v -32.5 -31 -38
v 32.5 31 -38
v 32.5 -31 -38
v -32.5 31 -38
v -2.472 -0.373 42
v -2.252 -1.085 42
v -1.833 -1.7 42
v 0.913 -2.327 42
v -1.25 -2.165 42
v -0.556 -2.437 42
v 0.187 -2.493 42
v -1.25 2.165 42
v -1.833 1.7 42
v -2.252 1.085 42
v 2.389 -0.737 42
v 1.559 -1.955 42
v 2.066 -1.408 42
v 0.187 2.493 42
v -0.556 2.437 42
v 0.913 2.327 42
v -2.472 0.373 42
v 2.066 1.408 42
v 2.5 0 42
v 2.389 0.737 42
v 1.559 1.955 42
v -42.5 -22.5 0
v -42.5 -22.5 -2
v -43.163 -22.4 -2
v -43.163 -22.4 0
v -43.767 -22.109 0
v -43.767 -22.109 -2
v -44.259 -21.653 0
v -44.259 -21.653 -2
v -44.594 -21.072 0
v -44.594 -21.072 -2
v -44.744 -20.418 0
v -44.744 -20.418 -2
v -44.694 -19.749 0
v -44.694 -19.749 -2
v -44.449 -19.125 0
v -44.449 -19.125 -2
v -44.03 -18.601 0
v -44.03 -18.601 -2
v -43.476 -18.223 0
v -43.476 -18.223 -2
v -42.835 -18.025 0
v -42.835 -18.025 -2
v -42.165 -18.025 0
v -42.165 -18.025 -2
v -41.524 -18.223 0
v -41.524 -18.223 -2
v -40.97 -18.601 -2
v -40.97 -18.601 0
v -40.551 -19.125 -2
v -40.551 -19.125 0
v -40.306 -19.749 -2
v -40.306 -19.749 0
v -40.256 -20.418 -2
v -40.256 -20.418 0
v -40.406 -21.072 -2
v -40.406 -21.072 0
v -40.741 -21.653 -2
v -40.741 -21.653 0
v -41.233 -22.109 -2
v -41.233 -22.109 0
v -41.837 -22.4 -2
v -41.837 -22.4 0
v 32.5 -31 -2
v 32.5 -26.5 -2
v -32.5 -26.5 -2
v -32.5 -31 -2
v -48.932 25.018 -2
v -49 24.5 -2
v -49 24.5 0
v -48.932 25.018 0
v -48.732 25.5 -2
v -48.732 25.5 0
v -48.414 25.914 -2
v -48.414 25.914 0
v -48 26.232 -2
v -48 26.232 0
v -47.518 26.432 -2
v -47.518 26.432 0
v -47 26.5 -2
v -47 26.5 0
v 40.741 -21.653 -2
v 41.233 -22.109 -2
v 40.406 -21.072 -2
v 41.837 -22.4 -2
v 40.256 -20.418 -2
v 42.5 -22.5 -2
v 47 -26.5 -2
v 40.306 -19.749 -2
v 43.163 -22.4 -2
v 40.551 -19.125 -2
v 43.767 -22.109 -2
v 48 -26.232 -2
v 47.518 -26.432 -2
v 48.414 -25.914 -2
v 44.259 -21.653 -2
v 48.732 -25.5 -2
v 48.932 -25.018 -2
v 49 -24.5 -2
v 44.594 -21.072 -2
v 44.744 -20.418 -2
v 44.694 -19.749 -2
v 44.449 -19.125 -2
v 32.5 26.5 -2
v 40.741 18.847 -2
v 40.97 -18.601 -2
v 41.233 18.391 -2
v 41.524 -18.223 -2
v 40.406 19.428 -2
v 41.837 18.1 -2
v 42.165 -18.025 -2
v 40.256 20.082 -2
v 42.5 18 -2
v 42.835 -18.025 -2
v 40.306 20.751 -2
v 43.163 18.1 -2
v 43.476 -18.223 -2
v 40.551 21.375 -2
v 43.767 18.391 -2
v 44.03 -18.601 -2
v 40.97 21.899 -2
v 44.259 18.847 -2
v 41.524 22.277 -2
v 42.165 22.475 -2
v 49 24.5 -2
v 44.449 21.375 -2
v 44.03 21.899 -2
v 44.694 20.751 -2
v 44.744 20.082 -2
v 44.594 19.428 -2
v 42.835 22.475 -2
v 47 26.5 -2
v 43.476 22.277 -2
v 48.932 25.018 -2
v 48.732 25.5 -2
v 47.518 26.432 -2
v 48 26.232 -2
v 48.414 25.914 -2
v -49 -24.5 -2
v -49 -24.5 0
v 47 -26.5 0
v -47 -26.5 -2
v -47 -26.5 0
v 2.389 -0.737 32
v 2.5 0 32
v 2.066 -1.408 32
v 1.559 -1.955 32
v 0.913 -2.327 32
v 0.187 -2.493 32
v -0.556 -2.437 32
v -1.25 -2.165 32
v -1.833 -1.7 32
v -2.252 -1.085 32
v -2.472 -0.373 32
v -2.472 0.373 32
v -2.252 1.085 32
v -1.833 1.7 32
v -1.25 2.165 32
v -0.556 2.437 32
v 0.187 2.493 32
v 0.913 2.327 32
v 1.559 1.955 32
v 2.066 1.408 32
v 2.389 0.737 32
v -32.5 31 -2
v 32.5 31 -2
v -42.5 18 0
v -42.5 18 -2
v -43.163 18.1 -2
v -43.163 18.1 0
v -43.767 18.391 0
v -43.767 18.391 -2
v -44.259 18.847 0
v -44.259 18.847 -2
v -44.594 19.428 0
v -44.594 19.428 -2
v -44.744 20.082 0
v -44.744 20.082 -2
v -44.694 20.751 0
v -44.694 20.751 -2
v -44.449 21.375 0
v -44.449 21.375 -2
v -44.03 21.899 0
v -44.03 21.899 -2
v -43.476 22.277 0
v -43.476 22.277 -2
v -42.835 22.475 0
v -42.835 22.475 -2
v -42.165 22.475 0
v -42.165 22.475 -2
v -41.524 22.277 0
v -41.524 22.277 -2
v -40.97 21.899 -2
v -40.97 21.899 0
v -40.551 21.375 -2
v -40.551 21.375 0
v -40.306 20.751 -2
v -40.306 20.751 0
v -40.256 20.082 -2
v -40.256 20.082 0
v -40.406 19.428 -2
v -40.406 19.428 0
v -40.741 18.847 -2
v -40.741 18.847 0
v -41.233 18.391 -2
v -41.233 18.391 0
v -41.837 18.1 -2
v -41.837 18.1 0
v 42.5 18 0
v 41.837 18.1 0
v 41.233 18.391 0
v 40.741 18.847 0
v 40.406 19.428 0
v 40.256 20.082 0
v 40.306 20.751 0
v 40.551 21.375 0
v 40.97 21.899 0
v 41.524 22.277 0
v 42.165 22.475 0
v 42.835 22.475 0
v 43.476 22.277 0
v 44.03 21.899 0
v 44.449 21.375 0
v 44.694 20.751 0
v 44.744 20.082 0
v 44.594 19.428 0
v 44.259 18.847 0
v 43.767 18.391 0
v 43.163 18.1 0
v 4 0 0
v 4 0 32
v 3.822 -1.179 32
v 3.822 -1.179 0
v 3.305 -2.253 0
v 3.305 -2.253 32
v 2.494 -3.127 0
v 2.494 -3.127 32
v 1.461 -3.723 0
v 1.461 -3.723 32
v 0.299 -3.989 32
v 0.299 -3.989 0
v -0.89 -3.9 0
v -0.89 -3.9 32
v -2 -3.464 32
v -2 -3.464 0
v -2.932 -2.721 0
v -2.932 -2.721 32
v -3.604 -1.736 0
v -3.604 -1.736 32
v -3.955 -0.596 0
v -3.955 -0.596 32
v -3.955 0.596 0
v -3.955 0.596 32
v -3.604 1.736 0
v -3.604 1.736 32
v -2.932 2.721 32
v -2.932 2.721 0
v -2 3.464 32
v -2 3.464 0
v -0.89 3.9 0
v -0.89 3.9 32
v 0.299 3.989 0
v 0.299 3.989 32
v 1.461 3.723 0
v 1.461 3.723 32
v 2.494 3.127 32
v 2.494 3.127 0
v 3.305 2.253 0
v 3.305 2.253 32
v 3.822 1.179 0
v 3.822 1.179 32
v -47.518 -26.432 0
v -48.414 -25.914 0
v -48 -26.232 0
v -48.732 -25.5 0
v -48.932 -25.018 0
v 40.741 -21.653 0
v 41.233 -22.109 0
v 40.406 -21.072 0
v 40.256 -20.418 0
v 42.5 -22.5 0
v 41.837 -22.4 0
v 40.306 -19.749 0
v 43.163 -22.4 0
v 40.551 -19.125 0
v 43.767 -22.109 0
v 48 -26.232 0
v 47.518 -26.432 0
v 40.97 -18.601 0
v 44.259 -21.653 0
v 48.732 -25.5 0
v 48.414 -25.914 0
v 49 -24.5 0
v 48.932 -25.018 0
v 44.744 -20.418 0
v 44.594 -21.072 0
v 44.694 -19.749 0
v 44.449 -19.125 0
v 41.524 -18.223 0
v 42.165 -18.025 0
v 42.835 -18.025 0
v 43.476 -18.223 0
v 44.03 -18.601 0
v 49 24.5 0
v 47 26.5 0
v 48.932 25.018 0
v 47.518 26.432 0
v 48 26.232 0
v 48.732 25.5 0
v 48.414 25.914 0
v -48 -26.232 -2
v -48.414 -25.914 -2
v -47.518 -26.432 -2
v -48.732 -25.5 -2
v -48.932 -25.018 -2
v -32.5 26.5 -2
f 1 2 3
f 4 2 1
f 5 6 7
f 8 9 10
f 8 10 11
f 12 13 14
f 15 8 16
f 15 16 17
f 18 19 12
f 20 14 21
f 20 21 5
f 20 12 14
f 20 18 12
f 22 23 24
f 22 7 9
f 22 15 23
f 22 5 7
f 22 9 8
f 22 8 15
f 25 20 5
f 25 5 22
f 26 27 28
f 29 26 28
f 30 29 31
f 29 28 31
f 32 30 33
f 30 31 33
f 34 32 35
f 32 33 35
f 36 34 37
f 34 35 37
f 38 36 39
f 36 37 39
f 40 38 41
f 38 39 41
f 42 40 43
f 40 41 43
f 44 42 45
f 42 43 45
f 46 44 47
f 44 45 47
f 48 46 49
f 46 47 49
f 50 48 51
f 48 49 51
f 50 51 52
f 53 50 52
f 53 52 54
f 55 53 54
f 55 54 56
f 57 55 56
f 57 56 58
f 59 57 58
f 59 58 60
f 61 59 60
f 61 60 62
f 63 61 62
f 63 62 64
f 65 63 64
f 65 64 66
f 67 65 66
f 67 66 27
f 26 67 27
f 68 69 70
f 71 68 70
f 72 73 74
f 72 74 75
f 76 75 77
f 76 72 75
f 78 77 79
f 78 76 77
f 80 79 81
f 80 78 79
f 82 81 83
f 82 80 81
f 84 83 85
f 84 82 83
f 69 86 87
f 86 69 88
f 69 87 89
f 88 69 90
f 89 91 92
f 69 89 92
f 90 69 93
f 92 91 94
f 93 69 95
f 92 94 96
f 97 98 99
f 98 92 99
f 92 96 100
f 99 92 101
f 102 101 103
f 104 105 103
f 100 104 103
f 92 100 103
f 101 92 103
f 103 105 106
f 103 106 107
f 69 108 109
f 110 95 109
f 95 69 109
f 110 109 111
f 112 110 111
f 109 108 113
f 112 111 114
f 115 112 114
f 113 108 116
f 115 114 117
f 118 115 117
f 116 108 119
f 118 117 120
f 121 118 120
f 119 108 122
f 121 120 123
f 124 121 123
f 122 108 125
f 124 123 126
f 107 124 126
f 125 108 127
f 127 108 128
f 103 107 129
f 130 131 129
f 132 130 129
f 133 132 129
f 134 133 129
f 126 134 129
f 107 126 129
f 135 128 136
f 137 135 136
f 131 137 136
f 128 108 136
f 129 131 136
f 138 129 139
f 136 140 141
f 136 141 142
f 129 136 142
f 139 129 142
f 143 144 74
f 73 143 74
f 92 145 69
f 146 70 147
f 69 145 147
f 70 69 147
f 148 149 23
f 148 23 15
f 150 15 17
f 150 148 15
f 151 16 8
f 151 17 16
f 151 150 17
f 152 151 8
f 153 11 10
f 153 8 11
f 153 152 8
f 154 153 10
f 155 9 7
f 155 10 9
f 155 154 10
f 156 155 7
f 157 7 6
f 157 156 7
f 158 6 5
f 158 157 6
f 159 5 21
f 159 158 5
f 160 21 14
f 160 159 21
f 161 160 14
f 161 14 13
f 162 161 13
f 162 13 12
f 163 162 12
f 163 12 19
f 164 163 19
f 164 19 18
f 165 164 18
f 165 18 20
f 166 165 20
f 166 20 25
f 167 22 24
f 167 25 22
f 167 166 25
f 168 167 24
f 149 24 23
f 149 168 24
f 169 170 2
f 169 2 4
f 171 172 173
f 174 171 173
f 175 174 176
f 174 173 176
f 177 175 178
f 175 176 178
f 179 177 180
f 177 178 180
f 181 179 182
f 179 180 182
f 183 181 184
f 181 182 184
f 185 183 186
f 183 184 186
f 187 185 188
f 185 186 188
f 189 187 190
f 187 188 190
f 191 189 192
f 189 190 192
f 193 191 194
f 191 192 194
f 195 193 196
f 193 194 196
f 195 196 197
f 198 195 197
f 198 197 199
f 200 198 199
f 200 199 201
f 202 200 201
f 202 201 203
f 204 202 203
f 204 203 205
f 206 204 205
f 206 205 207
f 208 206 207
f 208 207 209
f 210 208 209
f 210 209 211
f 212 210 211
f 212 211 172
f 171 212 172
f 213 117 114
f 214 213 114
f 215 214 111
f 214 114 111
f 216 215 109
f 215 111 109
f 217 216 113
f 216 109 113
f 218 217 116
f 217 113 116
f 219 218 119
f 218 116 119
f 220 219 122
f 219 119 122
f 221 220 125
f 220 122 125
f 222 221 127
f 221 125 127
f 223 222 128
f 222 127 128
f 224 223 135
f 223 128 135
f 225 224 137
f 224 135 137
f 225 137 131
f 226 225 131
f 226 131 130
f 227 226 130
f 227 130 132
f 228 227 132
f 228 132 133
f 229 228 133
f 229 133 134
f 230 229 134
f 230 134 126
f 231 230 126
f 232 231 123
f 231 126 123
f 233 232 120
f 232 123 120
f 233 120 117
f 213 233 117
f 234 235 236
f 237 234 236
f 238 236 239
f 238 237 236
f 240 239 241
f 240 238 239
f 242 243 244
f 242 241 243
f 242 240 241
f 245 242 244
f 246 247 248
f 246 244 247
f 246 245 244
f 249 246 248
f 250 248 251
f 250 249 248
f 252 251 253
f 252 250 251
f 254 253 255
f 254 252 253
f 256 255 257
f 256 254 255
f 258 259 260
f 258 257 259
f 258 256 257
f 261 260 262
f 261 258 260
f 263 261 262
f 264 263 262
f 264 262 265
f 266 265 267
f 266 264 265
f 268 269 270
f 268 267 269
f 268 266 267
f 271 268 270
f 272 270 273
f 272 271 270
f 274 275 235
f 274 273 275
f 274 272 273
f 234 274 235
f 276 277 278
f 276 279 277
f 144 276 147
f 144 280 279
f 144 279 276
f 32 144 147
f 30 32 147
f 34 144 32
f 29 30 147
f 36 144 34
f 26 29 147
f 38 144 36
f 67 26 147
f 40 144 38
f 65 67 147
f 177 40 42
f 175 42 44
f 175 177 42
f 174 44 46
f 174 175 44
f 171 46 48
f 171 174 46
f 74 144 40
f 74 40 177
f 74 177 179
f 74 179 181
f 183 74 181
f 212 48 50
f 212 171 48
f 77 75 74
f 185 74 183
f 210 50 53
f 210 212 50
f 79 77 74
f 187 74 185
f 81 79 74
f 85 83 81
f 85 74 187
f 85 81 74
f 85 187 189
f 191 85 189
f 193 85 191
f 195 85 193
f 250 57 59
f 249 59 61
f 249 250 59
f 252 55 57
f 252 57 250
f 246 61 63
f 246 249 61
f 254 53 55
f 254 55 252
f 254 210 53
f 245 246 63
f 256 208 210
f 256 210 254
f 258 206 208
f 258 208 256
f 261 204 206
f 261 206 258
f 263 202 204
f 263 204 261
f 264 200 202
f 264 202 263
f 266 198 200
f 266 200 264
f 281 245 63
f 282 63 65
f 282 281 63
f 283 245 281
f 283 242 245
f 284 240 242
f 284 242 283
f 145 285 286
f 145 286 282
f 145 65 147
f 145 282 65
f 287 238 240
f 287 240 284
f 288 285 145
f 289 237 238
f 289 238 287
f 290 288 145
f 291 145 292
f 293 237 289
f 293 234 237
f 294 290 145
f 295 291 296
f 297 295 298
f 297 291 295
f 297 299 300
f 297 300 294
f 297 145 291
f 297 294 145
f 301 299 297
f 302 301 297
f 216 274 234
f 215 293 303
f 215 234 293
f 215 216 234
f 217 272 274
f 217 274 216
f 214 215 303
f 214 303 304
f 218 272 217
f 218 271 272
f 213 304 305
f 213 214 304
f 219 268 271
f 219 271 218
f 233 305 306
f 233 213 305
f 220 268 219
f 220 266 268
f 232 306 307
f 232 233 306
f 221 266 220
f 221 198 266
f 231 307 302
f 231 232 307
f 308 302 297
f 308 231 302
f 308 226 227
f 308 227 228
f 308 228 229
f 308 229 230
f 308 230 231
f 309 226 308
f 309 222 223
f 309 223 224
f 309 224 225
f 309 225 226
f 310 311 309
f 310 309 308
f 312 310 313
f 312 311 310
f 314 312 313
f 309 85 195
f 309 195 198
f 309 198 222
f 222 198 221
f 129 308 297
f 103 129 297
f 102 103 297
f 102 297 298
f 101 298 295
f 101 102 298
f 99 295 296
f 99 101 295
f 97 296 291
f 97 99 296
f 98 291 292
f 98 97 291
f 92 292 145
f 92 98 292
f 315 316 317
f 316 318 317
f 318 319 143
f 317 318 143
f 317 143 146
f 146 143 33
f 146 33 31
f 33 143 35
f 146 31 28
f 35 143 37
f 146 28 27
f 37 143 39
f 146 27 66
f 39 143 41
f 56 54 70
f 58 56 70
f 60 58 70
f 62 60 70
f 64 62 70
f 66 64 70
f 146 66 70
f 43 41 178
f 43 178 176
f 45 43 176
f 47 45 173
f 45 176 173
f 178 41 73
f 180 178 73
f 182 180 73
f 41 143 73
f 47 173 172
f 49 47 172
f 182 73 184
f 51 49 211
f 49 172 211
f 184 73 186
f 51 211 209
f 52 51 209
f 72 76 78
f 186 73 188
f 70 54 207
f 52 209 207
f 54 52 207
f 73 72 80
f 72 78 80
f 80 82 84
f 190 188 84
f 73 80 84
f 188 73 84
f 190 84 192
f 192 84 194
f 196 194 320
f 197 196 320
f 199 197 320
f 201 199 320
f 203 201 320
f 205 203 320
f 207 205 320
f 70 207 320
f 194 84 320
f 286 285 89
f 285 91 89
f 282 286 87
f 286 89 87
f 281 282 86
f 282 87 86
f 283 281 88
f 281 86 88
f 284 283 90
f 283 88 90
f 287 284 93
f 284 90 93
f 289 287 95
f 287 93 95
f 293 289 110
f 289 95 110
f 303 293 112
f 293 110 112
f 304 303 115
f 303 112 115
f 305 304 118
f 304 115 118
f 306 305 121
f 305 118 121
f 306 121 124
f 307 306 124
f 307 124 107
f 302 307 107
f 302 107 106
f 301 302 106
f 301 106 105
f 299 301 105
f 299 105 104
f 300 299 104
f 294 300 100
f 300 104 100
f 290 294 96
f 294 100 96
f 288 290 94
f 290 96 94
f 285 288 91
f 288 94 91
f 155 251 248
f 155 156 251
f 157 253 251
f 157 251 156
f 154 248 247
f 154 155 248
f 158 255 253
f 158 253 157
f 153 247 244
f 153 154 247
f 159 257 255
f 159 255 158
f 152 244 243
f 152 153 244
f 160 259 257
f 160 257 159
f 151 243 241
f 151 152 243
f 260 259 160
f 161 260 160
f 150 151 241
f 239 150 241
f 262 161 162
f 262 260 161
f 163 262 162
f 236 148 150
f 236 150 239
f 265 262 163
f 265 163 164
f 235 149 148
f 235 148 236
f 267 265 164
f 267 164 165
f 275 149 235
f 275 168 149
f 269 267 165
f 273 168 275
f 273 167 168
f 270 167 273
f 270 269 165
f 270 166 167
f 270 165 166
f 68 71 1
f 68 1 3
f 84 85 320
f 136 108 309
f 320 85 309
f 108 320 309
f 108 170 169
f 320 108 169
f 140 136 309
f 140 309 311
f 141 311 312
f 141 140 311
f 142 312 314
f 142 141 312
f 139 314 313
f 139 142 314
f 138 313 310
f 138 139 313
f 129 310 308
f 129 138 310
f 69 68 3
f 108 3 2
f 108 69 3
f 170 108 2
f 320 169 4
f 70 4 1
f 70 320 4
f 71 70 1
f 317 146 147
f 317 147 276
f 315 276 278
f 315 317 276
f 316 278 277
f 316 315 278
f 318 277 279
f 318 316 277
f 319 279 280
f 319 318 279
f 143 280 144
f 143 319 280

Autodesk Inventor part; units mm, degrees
ref_plane "YZ Plane" through (0, 0, 0) normal (1, 0, 0) x (0, 1, 0)
ref_plane "XZ Plane" through (0, 0, 0) normal (0, 1, 0) x (-1, 0, 0)
ref_plane "XY Plane" through (0, 0, 0) normal (0, 0, 1) x (1, 0, 0)
sketch "JoystickMount" plane through (0, 0, 0) normal (0, 0, 1) x (1, 0, 0)
  line L0 (-49, 26.5) -> (49, 26.5)
  line L1 (49, 26.5) -> (49, -26.5)
  line L2 (49, -26.5) -> (-49, -26.5)
  line L3 (-49, -26.5) -> (-49, 26.5)
  point P0 (0, 0)
  point P1 (-49, 0)
  point P2 (0, 26.5)
  point P3 (0, -26.5)
  point P4 (49, 0)
  dimension "d0" = 53
  dimension "d2" = 98
extrude "JoystickMountPlate" add sketch "JoystickMount" against normal blind 2
fillet "MountPlateCornerFillet" radius 2 4 edges at (49, 26.5, -1) (-49, 26.5, -1) (-49, -26.5, -1) (49, -26.5, -1)
sketch "BodySketch" plane through (0, 0, -2) normal (0, 0, -1) x (-1, 0, 0)
  line L0 (-32.5, 31) -> (32.5, 31)
  line L1 (32.5, 31) -> (32.5, -31)
  line L2 (32.5, -31) -> (-32.5, -31)
  line L3 (-32.5, -31) -> (-32.5, 31)
  point P0 (0, 0)
  point P1 (-32.5, 0)
  point P2 (0, 31)
  dimension "d6" = 65
  dimension "d8" = 62
extrude "JoystickBody" add sketch "BodySketch" along normal blind 36
sketch "JoystickPostCenter" plane through (0, 0, 0) normal (0, 0, 1) x (1, 0, 0)
  circle A0 centre (0, 0) radius 4
  dimension "d11" = 8
extrude "Shaft" add sketch "JoystickPostCenter" along normal blind 32
sketch "ThreadSketch" plane through (0, 0, 32) normal (0, 0, 1) x (1, 0, 0)
  circle A0 centre (0, 0) radius 4 projected
  circle A1 centre (0, 0) radius 2.5
  dimension "d14" = 5
extrude "ShaftScrew" add sketch "ThreadSketch" along normal blind 10 contours A1
thread "ShaftThread" size "M5x0.8" class "6g" standard "ANSI Metric M Profile" full length
sketch "MountHoles" plane through (0, 0, 0) normal (0, 0, 1) x (1, 0, 0)
  circle A0 centre (0, 0) radius 4 projected
  line L0 (47, -26.5) -> (-47, -26.5) projected
  line L1 (-42.5, 20.25) -> (-42.5, -20.25) construction
  line L2 (-42.5, -20.25) -> (42.5, -20.25) construction
  point P0 (42.5, 20.25)
  point P1 (-42.5, 0)
  point P2 (0, -20.25)
  dimension "d44" = 40.5
  dimension "d46" = 85
hole "MountingHoles" at (-42.5, 20.25, 0) at (-42.5, -20.25, 0) at (42.5, -20.25, 0) at (42.5, 20.25, 0) direction (0, 0, -1) diameter 4.5 end through all clearance for "Flat Head Machine Screw" size "M4" standard "Ansi Metric M Profile"
properties part number "JLF-TP-8YT_body" material "Steel AISI 4620"
